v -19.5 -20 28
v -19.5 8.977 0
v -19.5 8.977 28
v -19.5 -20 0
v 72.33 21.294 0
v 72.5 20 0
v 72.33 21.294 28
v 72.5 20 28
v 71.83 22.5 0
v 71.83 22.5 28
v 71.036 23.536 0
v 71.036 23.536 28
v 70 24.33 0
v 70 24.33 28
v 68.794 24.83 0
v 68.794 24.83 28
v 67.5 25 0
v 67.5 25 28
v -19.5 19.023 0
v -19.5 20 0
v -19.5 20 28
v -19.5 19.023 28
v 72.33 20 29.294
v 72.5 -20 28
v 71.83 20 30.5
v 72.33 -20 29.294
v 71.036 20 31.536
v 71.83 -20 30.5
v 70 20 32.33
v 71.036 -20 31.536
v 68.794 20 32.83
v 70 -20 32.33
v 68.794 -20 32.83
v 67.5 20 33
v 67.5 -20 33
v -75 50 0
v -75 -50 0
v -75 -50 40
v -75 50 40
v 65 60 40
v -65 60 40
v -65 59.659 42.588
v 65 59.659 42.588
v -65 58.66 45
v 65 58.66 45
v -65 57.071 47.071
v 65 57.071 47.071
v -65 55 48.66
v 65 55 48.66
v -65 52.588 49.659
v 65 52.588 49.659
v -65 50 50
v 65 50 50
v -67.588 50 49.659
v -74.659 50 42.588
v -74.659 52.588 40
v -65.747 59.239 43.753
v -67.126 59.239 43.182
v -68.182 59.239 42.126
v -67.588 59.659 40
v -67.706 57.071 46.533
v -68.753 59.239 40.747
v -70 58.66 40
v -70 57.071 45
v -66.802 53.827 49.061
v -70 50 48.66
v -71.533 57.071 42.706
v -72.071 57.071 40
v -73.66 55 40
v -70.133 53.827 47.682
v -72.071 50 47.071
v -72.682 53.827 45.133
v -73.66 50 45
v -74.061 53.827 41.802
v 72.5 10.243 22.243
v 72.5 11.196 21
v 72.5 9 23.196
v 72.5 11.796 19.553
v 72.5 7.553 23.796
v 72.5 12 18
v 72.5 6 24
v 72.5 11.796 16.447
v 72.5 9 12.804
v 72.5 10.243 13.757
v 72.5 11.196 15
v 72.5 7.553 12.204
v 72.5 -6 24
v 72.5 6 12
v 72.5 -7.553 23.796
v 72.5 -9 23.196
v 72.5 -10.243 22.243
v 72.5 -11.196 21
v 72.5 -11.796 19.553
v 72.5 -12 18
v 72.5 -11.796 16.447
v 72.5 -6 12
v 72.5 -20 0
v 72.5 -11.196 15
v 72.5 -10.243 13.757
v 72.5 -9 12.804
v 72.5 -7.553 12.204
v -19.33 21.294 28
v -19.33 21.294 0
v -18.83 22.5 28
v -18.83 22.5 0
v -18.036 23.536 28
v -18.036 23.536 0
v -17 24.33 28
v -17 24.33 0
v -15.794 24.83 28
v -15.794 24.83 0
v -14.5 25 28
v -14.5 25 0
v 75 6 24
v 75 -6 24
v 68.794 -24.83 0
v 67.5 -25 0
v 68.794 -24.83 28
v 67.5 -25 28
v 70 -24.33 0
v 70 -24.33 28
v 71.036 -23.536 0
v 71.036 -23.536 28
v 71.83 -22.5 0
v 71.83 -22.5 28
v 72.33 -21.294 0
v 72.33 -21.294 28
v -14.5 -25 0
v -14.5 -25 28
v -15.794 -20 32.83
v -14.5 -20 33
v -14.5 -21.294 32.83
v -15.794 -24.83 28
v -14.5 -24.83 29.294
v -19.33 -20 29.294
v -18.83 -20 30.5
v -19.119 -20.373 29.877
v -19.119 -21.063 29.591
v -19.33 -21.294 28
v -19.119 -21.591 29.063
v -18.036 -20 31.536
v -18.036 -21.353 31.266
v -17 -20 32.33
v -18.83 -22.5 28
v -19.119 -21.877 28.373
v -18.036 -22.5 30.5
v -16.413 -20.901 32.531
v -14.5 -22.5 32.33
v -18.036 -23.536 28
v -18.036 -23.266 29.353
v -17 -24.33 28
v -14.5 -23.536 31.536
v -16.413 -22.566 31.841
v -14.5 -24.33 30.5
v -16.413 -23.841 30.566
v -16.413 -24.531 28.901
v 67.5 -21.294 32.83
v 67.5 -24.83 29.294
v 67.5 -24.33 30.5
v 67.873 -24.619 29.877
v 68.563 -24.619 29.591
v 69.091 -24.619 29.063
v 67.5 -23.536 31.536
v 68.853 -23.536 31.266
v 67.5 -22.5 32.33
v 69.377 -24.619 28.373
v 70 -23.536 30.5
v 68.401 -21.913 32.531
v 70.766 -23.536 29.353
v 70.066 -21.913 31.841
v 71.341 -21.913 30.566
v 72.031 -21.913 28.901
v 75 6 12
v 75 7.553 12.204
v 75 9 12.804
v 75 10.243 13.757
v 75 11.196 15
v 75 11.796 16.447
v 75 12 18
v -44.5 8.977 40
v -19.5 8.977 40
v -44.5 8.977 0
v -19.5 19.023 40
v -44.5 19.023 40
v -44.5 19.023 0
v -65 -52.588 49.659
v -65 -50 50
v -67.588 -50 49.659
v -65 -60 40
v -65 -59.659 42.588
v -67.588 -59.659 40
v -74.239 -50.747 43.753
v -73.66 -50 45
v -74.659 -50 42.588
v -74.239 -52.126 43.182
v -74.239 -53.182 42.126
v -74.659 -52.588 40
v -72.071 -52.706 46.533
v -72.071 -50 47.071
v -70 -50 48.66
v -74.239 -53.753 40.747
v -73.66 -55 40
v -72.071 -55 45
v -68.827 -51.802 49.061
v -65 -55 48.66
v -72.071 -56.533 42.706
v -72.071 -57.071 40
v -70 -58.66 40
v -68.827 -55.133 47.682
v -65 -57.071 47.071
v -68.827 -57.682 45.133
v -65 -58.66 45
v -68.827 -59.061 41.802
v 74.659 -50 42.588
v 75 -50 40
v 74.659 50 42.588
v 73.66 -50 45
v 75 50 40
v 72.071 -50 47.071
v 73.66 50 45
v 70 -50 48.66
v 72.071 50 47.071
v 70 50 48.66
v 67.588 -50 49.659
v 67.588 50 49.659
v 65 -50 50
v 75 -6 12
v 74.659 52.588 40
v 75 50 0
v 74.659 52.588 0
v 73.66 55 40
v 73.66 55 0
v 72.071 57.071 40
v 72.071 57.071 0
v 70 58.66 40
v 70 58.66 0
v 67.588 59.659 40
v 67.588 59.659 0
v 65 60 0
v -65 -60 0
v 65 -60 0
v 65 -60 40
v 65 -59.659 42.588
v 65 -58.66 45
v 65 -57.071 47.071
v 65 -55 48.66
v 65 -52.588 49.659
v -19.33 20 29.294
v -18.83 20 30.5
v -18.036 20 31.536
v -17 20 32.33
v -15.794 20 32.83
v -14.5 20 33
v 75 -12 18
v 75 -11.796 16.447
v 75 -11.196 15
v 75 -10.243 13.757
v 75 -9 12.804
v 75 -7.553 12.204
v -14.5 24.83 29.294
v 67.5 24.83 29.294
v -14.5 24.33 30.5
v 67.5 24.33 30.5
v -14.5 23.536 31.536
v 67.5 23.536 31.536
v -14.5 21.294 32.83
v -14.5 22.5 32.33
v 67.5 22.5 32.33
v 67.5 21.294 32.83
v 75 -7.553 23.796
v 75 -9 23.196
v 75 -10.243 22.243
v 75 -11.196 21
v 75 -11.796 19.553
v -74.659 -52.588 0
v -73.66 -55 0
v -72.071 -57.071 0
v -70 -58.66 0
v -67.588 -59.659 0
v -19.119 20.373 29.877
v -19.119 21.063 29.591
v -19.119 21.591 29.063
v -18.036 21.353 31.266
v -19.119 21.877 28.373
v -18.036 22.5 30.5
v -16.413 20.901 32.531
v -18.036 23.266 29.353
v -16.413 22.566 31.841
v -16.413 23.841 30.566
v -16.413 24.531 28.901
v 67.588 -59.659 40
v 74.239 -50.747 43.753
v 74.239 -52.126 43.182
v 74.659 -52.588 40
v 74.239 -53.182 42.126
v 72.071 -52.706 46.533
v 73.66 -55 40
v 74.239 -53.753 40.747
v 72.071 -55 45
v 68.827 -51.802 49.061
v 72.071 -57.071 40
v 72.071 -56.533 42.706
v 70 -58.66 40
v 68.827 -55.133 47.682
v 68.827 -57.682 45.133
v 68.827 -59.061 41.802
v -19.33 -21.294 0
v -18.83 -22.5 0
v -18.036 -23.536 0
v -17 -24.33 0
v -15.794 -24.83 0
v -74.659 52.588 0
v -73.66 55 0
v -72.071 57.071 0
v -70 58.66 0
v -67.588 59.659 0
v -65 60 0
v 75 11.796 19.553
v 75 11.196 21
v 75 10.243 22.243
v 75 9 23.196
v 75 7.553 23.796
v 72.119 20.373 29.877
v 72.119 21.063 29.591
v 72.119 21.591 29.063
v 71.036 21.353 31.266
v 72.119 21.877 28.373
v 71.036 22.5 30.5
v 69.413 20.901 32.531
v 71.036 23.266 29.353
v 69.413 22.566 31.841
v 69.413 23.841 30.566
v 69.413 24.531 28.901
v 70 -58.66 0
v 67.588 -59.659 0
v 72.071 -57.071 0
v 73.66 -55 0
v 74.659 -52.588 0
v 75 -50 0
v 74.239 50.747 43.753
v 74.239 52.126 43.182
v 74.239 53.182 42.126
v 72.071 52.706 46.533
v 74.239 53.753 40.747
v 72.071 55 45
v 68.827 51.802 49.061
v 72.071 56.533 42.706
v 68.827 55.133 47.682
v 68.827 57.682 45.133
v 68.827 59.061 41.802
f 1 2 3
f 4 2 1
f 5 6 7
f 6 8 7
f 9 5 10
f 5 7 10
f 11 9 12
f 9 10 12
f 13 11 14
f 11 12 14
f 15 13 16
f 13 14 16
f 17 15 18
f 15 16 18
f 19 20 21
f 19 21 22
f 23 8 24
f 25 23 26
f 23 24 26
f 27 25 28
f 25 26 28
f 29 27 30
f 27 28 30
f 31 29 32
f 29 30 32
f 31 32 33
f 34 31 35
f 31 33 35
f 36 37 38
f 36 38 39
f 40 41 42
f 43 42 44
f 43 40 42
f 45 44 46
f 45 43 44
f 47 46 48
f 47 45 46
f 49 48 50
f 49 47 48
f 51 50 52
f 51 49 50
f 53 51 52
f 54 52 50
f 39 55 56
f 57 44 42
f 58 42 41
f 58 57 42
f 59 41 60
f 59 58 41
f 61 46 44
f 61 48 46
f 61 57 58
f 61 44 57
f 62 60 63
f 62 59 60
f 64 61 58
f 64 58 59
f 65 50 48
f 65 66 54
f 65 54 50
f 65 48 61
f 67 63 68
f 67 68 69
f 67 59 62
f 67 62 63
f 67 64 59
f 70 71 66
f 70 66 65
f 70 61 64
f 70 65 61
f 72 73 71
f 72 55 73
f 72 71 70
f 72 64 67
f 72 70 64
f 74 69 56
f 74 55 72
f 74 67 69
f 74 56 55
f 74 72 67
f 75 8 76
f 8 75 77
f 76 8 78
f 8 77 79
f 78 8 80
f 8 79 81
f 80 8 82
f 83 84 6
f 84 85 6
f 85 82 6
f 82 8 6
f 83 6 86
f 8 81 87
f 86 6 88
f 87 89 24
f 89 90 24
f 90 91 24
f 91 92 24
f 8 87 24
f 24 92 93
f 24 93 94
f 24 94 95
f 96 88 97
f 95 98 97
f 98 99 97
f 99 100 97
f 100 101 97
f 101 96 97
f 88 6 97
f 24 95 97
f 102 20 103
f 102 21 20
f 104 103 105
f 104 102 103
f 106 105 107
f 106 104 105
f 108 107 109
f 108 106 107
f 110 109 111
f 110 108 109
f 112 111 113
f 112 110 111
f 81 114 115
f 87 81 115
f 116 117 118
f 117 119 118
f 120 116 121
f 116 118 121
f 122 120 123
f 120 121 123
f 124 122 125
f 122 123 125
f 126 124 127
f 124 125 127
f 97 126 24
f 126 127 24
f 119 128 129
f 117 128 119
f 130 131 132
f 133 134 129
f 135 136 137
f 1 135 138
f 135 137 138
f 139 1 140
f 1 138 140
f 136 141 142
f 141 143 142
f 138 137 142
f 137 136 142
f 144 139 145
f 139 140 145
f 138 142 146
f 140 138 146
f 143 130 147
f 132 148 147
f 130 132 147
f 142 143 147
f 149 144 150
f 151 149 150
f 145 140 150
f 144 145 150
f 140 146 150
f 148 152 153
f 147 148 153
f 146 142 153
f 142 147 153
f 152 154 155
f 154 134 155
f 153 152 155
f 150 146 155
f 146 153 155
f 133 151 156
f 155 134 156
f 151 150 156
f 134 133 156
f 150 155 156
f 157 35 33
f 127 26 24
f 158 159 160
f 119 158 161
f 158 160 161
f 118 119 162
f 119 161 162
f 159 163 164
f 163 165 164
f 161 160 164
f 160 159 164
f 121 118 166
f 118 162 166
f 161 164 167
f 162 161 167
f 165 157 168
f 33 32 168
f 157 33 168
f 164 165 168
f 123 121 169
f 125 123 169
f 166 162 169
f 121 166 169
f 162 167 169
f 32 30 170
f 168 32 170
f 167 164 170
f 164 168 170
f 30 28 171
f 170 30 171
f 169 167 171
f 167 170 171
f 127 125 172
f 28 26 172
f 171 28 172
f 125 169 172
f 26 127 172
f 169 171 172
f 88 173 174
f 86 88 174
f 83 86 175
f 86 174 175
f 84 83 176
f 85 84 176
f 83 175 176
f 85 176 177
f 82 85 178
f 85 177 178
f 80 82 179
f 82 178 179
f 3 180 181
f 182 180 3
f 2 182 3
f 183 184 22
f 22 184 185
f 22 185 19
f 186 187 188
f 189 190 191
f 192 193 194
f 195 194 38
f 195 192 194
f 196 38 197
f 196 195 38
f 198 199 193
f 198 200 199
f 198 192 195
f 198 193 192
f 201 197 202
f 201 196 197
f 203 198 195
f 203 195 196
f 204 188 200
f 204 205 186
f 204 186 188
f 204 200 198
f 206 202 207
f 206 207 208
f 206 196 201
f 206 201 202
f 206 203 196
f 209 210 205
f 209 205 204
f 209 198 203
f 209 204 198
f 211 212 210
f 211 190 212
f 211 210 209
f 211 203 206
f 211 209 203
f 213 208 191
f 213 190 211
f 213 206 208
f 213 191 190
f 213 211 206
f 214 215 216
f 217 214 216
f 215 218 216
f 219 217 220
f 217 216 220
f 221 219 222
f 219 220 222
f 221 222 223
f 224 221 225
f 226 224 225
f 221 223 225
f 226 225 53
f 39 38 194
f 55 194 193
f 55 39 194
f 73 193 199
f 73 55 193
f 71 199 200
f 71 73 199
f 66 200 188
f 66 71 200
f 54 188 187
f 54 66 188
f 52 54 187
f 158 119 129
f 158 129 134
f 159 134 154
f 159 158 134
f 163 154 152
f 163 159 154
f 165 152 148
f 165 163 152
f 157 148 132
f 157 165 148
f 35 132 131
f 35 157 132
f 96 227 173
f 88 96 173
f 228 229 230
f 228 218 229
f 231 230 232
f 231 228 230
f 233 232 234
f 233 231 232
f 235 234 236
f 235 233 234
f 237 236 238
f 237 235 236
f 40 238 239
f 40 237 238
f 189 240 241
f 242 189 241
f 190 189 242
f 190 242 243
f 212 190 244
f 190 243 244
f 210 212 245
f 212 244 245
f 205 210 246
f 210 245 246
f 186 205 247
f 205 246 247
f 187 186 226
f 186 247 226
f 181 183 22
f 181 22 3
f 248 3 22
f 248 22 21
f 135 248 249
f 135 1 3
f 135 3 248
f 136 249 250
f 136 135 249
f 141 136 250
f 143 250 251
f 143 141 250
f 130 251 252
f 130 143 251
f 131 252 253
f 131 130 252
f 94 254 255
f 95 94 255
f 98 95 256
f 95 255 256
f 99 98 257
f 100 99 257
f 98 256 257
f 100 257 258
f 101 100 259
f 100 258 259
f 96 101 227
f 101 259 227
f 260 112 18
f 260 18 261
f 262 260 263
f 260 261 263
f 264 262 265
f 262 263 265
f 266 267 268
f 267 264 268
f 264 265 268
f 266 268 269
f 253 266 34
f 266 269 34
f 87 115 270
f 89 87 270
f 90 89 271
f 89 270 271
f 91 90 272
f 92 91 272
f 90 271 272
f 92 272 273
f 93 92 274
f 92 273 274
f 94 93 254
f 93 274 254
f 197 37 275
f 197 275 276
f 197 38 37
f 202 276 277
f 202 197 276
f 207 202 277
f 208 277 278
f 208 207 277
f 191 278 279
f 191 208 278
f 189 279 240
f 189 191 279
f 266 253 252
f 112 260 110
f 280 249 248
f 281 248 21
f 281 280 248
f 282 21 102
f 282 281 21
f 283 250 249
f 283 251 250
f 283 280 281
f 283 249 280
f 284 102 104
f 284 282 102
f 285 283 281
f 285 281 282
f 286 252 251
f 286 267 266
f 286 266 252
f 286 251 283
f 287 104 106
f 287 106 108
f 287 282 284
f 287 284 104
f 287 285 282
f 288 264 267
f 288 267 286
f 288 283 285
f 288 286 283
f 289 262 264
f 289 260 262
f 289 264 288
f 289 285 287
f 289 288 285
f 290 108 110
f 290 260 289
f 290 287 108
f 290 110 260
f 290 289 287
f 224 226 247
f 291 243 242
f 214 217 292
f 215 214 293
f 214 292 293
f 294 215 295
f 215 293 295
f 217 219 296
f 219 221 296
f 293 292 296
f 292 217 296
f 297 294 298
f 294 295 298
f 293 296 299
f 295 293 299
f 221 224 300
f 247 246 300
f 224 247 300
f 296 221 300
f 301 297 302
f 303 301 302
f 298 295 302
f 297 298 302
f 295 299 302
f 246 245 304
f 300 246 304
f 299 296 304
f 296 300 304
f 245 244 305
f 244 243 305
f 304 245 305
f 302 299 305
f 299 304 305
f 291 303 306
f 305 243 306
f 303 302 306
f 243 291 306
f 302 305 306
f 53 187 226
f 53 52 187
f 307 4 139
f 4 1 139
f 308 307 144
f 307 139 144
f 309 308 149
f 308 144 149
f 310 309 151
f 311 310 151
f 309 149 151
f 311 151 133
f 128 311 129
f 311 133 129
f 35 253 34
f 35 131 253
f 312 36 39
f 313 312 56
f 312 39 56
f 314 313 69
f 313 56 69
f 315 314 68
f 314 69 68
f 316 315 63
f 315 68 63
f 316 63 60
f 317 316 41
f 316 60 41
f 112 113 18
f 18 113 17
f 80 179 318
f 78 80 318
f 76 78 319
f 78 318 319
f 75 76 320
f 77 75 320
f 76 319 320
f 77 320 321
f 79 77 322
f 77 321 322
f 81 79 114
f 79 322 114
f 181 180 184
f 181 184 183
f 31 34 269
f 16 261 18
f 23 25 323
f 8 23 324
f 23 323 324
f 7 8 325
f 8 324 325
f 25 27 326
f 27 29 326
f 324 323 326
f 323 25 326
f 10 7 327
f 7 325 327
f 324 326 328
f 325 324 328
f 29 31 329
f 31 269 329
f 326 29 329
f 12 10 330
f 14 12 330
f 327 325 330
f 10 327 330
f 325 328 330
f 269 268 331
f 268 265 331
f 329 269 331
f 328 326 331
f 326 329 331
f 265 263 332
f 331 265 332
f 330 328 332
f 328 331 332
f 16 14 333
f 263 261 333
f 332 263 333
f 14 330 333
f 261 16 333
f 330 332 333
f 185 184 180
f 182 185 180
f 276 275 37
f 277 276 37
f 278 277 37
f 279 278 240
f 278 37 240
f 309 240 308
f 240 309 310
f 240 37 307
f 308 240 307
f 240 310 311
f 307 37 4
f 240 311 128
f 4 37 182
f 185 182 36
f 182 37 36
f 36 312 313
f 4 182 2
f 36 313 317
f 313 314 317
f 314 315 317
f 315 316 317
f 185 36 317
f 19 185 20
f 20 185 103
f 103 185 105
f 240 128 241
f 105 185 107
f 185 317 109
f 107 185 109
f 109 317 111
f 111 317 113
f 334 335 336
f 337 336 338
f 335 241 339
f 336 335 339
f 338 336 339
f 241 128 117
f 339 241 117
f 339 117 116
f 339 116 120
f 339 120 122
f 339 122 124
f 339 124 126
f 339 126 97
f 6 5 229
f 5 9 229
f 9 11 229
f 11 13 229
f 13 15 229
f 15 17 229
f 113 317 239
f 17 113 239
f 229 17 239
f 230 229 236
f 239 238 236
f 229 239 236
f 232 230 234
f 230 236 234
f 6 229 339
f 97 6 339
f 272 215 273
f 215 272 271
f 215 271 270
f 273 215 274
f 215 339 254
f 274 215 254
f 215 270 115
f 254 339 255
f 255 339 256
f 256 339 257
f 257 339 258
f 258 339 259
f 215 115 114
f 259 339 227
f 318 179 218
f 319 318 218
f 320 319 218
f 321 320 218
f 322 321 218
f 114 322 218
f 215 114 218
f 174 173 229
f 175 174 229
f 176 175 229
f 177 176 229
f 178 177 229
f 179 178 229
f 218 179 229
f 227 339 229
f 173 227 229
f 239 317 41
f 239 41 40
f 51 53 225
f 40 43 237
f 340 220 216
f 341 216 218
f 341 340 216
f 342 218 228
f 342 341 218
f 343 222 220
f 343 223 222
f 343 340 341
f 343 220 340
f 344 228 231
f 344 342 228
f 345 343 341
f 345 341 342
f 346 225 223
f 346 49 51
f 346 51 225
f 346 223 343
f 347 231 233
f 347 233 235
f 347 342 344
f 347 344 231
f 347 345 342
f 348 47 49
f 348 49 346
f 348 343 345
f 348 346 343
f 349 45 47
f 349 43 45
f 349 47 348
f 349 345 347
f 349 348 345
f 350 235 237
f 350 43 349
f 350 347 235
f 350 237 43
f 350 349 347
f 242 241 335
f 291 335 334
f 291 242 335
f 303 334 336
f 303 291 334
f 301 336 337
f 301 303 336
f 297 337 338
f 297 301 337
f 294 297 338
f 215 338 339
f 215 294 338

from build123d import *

# Parameters (mm, degrees)
F0_W     = 150
F0_H     = 120
F1_DEPTH = 50
F2_R     = 10
F3_W     = 92
F3_H     = 50
F4_DEPTH = 33
F5_R     = 5
F6_W     = 25
F6_H     = 10.0465611815
F7_DEPTH = 40
F9_DEPTH = 25


with BuildPart() as f1:
    # F0 (on Top) → F1 (new body)
    with BuildSketch(Plane.XY):
        Rectangle(F0_W, F0_H)
    extrude(amount=F1_DEPTH)

    # F2
    f2_edges = [f1.edges().sort_by_distance(p)[0] for p in [
        (0, -60, 50),
        (-75, 0, 50),
        (0, 60, 50),
        (75, 0, 50),
        (-75, -60, 25),
        (75, -60, 25),
        (75, 60, 25),
        (-75, 60, 25),
    ]]
    fillet(f2_edges, radius=F2_R)

    # F3 (on face) → F4 (cut)
    with BuildSketch(Plane(origin=(0, 0, 0), x_dir=(1, 0, 0), z_dir=(0, 0, -1))):
        with Locations((26.5, 0)):
            Rectangle(F3_W, F3_H)
    extrude(amount=-F4_DEPTH, mode=Mode.SUBTRACT)

    # F5
    f5_edges = [f1.edges().sort_by_distance(p)[0] for p in [
        (26.5, 25, 33),
        (72.5, 0, 33),
        (26.5, -25, 33),
        (-19.5, 0, 33),
        (-19.5, -25, 16.5),
        (72.5, -25, 16.5),
        (-19.5, 25, 16.5),
        (72.5, 25, 16.5),
    ]]
    fillet(f5_edges, radius=F5_R)

    # F6 (on face) → F7 (cut)
    with BuildSketch(Plane(origin=(0, 0, 0), x_dir=(1, 0, 0), z_dir=(0, 0, -1))):
        with Locations((-32, -14)):
            Rectangle(F6_W, F6_H)
    extrude(amount=-F7_DEPTH, mode=Mode.SUBTRACT)

    # F8 (on face) → F9 (cut)
    with BuildSketch(Plane.YZ.offset(75)):
        with BuildLine():
            Line((12, 18), (0, 18))
            ThreePointArc((0, 18), (1.7573593129, 13.7573593129), (6, 12))
            ThreePointArc((6, 12), (10.2426406871, 13.7573593129), (12, 18))
        make_face()
        with BuildLine():
            ThreePointArc((6, 24), (1.7573593129, 22.2426406871), (0, 18))
            Line((0, 18), (12, 18))
            ThreePointArc((12, 18), (10.2426406871, 22.2426406871), (6, 24))
        make_face()
        with BuildLine():
            ThreePointArc((-6, 24), (-1.7573593129, 22.2426406871), (0, 18))
            ThreePointArc((0, 18), (1.7573593129, 22.2426406871), (6, 24))
            Line((6, 24), (-6, 24))
        make_face()
        with BuildLine():
            Line((-12, 18), (0, 18))
            ThreePointArc((0, 18), (-1.7573593129, 22.2426406871), (-6, 24))
            ThreePointArc((-6, 24), (-10.2426406871, 22.2426406871), (-12, 18))
        make_face()
        with BuildLine():
            ThreePointArc((-6, 12), (-1.7573593129, 13.7573593129), (0, 18))
            Line((0, 18), (-12, 18))
            ThreePointArc((-12, 18), (-10.2426406871, 13.7573593129), (-6, 12))
        make_face()
        with BuildLine():
            ThreePointArc((6, 12), (1.7573593129, 13.7573593129), (0, 18))
            ThreePointArc((0, 18), (-1.7573593129, 13.7573593129), (-6, 12))
            Line((-6, 12), (6, 12))
        make_face()
    extrude(amount=-F9_DEPTH, mode=Mode.SUBTRACT)


solid = f1.part
